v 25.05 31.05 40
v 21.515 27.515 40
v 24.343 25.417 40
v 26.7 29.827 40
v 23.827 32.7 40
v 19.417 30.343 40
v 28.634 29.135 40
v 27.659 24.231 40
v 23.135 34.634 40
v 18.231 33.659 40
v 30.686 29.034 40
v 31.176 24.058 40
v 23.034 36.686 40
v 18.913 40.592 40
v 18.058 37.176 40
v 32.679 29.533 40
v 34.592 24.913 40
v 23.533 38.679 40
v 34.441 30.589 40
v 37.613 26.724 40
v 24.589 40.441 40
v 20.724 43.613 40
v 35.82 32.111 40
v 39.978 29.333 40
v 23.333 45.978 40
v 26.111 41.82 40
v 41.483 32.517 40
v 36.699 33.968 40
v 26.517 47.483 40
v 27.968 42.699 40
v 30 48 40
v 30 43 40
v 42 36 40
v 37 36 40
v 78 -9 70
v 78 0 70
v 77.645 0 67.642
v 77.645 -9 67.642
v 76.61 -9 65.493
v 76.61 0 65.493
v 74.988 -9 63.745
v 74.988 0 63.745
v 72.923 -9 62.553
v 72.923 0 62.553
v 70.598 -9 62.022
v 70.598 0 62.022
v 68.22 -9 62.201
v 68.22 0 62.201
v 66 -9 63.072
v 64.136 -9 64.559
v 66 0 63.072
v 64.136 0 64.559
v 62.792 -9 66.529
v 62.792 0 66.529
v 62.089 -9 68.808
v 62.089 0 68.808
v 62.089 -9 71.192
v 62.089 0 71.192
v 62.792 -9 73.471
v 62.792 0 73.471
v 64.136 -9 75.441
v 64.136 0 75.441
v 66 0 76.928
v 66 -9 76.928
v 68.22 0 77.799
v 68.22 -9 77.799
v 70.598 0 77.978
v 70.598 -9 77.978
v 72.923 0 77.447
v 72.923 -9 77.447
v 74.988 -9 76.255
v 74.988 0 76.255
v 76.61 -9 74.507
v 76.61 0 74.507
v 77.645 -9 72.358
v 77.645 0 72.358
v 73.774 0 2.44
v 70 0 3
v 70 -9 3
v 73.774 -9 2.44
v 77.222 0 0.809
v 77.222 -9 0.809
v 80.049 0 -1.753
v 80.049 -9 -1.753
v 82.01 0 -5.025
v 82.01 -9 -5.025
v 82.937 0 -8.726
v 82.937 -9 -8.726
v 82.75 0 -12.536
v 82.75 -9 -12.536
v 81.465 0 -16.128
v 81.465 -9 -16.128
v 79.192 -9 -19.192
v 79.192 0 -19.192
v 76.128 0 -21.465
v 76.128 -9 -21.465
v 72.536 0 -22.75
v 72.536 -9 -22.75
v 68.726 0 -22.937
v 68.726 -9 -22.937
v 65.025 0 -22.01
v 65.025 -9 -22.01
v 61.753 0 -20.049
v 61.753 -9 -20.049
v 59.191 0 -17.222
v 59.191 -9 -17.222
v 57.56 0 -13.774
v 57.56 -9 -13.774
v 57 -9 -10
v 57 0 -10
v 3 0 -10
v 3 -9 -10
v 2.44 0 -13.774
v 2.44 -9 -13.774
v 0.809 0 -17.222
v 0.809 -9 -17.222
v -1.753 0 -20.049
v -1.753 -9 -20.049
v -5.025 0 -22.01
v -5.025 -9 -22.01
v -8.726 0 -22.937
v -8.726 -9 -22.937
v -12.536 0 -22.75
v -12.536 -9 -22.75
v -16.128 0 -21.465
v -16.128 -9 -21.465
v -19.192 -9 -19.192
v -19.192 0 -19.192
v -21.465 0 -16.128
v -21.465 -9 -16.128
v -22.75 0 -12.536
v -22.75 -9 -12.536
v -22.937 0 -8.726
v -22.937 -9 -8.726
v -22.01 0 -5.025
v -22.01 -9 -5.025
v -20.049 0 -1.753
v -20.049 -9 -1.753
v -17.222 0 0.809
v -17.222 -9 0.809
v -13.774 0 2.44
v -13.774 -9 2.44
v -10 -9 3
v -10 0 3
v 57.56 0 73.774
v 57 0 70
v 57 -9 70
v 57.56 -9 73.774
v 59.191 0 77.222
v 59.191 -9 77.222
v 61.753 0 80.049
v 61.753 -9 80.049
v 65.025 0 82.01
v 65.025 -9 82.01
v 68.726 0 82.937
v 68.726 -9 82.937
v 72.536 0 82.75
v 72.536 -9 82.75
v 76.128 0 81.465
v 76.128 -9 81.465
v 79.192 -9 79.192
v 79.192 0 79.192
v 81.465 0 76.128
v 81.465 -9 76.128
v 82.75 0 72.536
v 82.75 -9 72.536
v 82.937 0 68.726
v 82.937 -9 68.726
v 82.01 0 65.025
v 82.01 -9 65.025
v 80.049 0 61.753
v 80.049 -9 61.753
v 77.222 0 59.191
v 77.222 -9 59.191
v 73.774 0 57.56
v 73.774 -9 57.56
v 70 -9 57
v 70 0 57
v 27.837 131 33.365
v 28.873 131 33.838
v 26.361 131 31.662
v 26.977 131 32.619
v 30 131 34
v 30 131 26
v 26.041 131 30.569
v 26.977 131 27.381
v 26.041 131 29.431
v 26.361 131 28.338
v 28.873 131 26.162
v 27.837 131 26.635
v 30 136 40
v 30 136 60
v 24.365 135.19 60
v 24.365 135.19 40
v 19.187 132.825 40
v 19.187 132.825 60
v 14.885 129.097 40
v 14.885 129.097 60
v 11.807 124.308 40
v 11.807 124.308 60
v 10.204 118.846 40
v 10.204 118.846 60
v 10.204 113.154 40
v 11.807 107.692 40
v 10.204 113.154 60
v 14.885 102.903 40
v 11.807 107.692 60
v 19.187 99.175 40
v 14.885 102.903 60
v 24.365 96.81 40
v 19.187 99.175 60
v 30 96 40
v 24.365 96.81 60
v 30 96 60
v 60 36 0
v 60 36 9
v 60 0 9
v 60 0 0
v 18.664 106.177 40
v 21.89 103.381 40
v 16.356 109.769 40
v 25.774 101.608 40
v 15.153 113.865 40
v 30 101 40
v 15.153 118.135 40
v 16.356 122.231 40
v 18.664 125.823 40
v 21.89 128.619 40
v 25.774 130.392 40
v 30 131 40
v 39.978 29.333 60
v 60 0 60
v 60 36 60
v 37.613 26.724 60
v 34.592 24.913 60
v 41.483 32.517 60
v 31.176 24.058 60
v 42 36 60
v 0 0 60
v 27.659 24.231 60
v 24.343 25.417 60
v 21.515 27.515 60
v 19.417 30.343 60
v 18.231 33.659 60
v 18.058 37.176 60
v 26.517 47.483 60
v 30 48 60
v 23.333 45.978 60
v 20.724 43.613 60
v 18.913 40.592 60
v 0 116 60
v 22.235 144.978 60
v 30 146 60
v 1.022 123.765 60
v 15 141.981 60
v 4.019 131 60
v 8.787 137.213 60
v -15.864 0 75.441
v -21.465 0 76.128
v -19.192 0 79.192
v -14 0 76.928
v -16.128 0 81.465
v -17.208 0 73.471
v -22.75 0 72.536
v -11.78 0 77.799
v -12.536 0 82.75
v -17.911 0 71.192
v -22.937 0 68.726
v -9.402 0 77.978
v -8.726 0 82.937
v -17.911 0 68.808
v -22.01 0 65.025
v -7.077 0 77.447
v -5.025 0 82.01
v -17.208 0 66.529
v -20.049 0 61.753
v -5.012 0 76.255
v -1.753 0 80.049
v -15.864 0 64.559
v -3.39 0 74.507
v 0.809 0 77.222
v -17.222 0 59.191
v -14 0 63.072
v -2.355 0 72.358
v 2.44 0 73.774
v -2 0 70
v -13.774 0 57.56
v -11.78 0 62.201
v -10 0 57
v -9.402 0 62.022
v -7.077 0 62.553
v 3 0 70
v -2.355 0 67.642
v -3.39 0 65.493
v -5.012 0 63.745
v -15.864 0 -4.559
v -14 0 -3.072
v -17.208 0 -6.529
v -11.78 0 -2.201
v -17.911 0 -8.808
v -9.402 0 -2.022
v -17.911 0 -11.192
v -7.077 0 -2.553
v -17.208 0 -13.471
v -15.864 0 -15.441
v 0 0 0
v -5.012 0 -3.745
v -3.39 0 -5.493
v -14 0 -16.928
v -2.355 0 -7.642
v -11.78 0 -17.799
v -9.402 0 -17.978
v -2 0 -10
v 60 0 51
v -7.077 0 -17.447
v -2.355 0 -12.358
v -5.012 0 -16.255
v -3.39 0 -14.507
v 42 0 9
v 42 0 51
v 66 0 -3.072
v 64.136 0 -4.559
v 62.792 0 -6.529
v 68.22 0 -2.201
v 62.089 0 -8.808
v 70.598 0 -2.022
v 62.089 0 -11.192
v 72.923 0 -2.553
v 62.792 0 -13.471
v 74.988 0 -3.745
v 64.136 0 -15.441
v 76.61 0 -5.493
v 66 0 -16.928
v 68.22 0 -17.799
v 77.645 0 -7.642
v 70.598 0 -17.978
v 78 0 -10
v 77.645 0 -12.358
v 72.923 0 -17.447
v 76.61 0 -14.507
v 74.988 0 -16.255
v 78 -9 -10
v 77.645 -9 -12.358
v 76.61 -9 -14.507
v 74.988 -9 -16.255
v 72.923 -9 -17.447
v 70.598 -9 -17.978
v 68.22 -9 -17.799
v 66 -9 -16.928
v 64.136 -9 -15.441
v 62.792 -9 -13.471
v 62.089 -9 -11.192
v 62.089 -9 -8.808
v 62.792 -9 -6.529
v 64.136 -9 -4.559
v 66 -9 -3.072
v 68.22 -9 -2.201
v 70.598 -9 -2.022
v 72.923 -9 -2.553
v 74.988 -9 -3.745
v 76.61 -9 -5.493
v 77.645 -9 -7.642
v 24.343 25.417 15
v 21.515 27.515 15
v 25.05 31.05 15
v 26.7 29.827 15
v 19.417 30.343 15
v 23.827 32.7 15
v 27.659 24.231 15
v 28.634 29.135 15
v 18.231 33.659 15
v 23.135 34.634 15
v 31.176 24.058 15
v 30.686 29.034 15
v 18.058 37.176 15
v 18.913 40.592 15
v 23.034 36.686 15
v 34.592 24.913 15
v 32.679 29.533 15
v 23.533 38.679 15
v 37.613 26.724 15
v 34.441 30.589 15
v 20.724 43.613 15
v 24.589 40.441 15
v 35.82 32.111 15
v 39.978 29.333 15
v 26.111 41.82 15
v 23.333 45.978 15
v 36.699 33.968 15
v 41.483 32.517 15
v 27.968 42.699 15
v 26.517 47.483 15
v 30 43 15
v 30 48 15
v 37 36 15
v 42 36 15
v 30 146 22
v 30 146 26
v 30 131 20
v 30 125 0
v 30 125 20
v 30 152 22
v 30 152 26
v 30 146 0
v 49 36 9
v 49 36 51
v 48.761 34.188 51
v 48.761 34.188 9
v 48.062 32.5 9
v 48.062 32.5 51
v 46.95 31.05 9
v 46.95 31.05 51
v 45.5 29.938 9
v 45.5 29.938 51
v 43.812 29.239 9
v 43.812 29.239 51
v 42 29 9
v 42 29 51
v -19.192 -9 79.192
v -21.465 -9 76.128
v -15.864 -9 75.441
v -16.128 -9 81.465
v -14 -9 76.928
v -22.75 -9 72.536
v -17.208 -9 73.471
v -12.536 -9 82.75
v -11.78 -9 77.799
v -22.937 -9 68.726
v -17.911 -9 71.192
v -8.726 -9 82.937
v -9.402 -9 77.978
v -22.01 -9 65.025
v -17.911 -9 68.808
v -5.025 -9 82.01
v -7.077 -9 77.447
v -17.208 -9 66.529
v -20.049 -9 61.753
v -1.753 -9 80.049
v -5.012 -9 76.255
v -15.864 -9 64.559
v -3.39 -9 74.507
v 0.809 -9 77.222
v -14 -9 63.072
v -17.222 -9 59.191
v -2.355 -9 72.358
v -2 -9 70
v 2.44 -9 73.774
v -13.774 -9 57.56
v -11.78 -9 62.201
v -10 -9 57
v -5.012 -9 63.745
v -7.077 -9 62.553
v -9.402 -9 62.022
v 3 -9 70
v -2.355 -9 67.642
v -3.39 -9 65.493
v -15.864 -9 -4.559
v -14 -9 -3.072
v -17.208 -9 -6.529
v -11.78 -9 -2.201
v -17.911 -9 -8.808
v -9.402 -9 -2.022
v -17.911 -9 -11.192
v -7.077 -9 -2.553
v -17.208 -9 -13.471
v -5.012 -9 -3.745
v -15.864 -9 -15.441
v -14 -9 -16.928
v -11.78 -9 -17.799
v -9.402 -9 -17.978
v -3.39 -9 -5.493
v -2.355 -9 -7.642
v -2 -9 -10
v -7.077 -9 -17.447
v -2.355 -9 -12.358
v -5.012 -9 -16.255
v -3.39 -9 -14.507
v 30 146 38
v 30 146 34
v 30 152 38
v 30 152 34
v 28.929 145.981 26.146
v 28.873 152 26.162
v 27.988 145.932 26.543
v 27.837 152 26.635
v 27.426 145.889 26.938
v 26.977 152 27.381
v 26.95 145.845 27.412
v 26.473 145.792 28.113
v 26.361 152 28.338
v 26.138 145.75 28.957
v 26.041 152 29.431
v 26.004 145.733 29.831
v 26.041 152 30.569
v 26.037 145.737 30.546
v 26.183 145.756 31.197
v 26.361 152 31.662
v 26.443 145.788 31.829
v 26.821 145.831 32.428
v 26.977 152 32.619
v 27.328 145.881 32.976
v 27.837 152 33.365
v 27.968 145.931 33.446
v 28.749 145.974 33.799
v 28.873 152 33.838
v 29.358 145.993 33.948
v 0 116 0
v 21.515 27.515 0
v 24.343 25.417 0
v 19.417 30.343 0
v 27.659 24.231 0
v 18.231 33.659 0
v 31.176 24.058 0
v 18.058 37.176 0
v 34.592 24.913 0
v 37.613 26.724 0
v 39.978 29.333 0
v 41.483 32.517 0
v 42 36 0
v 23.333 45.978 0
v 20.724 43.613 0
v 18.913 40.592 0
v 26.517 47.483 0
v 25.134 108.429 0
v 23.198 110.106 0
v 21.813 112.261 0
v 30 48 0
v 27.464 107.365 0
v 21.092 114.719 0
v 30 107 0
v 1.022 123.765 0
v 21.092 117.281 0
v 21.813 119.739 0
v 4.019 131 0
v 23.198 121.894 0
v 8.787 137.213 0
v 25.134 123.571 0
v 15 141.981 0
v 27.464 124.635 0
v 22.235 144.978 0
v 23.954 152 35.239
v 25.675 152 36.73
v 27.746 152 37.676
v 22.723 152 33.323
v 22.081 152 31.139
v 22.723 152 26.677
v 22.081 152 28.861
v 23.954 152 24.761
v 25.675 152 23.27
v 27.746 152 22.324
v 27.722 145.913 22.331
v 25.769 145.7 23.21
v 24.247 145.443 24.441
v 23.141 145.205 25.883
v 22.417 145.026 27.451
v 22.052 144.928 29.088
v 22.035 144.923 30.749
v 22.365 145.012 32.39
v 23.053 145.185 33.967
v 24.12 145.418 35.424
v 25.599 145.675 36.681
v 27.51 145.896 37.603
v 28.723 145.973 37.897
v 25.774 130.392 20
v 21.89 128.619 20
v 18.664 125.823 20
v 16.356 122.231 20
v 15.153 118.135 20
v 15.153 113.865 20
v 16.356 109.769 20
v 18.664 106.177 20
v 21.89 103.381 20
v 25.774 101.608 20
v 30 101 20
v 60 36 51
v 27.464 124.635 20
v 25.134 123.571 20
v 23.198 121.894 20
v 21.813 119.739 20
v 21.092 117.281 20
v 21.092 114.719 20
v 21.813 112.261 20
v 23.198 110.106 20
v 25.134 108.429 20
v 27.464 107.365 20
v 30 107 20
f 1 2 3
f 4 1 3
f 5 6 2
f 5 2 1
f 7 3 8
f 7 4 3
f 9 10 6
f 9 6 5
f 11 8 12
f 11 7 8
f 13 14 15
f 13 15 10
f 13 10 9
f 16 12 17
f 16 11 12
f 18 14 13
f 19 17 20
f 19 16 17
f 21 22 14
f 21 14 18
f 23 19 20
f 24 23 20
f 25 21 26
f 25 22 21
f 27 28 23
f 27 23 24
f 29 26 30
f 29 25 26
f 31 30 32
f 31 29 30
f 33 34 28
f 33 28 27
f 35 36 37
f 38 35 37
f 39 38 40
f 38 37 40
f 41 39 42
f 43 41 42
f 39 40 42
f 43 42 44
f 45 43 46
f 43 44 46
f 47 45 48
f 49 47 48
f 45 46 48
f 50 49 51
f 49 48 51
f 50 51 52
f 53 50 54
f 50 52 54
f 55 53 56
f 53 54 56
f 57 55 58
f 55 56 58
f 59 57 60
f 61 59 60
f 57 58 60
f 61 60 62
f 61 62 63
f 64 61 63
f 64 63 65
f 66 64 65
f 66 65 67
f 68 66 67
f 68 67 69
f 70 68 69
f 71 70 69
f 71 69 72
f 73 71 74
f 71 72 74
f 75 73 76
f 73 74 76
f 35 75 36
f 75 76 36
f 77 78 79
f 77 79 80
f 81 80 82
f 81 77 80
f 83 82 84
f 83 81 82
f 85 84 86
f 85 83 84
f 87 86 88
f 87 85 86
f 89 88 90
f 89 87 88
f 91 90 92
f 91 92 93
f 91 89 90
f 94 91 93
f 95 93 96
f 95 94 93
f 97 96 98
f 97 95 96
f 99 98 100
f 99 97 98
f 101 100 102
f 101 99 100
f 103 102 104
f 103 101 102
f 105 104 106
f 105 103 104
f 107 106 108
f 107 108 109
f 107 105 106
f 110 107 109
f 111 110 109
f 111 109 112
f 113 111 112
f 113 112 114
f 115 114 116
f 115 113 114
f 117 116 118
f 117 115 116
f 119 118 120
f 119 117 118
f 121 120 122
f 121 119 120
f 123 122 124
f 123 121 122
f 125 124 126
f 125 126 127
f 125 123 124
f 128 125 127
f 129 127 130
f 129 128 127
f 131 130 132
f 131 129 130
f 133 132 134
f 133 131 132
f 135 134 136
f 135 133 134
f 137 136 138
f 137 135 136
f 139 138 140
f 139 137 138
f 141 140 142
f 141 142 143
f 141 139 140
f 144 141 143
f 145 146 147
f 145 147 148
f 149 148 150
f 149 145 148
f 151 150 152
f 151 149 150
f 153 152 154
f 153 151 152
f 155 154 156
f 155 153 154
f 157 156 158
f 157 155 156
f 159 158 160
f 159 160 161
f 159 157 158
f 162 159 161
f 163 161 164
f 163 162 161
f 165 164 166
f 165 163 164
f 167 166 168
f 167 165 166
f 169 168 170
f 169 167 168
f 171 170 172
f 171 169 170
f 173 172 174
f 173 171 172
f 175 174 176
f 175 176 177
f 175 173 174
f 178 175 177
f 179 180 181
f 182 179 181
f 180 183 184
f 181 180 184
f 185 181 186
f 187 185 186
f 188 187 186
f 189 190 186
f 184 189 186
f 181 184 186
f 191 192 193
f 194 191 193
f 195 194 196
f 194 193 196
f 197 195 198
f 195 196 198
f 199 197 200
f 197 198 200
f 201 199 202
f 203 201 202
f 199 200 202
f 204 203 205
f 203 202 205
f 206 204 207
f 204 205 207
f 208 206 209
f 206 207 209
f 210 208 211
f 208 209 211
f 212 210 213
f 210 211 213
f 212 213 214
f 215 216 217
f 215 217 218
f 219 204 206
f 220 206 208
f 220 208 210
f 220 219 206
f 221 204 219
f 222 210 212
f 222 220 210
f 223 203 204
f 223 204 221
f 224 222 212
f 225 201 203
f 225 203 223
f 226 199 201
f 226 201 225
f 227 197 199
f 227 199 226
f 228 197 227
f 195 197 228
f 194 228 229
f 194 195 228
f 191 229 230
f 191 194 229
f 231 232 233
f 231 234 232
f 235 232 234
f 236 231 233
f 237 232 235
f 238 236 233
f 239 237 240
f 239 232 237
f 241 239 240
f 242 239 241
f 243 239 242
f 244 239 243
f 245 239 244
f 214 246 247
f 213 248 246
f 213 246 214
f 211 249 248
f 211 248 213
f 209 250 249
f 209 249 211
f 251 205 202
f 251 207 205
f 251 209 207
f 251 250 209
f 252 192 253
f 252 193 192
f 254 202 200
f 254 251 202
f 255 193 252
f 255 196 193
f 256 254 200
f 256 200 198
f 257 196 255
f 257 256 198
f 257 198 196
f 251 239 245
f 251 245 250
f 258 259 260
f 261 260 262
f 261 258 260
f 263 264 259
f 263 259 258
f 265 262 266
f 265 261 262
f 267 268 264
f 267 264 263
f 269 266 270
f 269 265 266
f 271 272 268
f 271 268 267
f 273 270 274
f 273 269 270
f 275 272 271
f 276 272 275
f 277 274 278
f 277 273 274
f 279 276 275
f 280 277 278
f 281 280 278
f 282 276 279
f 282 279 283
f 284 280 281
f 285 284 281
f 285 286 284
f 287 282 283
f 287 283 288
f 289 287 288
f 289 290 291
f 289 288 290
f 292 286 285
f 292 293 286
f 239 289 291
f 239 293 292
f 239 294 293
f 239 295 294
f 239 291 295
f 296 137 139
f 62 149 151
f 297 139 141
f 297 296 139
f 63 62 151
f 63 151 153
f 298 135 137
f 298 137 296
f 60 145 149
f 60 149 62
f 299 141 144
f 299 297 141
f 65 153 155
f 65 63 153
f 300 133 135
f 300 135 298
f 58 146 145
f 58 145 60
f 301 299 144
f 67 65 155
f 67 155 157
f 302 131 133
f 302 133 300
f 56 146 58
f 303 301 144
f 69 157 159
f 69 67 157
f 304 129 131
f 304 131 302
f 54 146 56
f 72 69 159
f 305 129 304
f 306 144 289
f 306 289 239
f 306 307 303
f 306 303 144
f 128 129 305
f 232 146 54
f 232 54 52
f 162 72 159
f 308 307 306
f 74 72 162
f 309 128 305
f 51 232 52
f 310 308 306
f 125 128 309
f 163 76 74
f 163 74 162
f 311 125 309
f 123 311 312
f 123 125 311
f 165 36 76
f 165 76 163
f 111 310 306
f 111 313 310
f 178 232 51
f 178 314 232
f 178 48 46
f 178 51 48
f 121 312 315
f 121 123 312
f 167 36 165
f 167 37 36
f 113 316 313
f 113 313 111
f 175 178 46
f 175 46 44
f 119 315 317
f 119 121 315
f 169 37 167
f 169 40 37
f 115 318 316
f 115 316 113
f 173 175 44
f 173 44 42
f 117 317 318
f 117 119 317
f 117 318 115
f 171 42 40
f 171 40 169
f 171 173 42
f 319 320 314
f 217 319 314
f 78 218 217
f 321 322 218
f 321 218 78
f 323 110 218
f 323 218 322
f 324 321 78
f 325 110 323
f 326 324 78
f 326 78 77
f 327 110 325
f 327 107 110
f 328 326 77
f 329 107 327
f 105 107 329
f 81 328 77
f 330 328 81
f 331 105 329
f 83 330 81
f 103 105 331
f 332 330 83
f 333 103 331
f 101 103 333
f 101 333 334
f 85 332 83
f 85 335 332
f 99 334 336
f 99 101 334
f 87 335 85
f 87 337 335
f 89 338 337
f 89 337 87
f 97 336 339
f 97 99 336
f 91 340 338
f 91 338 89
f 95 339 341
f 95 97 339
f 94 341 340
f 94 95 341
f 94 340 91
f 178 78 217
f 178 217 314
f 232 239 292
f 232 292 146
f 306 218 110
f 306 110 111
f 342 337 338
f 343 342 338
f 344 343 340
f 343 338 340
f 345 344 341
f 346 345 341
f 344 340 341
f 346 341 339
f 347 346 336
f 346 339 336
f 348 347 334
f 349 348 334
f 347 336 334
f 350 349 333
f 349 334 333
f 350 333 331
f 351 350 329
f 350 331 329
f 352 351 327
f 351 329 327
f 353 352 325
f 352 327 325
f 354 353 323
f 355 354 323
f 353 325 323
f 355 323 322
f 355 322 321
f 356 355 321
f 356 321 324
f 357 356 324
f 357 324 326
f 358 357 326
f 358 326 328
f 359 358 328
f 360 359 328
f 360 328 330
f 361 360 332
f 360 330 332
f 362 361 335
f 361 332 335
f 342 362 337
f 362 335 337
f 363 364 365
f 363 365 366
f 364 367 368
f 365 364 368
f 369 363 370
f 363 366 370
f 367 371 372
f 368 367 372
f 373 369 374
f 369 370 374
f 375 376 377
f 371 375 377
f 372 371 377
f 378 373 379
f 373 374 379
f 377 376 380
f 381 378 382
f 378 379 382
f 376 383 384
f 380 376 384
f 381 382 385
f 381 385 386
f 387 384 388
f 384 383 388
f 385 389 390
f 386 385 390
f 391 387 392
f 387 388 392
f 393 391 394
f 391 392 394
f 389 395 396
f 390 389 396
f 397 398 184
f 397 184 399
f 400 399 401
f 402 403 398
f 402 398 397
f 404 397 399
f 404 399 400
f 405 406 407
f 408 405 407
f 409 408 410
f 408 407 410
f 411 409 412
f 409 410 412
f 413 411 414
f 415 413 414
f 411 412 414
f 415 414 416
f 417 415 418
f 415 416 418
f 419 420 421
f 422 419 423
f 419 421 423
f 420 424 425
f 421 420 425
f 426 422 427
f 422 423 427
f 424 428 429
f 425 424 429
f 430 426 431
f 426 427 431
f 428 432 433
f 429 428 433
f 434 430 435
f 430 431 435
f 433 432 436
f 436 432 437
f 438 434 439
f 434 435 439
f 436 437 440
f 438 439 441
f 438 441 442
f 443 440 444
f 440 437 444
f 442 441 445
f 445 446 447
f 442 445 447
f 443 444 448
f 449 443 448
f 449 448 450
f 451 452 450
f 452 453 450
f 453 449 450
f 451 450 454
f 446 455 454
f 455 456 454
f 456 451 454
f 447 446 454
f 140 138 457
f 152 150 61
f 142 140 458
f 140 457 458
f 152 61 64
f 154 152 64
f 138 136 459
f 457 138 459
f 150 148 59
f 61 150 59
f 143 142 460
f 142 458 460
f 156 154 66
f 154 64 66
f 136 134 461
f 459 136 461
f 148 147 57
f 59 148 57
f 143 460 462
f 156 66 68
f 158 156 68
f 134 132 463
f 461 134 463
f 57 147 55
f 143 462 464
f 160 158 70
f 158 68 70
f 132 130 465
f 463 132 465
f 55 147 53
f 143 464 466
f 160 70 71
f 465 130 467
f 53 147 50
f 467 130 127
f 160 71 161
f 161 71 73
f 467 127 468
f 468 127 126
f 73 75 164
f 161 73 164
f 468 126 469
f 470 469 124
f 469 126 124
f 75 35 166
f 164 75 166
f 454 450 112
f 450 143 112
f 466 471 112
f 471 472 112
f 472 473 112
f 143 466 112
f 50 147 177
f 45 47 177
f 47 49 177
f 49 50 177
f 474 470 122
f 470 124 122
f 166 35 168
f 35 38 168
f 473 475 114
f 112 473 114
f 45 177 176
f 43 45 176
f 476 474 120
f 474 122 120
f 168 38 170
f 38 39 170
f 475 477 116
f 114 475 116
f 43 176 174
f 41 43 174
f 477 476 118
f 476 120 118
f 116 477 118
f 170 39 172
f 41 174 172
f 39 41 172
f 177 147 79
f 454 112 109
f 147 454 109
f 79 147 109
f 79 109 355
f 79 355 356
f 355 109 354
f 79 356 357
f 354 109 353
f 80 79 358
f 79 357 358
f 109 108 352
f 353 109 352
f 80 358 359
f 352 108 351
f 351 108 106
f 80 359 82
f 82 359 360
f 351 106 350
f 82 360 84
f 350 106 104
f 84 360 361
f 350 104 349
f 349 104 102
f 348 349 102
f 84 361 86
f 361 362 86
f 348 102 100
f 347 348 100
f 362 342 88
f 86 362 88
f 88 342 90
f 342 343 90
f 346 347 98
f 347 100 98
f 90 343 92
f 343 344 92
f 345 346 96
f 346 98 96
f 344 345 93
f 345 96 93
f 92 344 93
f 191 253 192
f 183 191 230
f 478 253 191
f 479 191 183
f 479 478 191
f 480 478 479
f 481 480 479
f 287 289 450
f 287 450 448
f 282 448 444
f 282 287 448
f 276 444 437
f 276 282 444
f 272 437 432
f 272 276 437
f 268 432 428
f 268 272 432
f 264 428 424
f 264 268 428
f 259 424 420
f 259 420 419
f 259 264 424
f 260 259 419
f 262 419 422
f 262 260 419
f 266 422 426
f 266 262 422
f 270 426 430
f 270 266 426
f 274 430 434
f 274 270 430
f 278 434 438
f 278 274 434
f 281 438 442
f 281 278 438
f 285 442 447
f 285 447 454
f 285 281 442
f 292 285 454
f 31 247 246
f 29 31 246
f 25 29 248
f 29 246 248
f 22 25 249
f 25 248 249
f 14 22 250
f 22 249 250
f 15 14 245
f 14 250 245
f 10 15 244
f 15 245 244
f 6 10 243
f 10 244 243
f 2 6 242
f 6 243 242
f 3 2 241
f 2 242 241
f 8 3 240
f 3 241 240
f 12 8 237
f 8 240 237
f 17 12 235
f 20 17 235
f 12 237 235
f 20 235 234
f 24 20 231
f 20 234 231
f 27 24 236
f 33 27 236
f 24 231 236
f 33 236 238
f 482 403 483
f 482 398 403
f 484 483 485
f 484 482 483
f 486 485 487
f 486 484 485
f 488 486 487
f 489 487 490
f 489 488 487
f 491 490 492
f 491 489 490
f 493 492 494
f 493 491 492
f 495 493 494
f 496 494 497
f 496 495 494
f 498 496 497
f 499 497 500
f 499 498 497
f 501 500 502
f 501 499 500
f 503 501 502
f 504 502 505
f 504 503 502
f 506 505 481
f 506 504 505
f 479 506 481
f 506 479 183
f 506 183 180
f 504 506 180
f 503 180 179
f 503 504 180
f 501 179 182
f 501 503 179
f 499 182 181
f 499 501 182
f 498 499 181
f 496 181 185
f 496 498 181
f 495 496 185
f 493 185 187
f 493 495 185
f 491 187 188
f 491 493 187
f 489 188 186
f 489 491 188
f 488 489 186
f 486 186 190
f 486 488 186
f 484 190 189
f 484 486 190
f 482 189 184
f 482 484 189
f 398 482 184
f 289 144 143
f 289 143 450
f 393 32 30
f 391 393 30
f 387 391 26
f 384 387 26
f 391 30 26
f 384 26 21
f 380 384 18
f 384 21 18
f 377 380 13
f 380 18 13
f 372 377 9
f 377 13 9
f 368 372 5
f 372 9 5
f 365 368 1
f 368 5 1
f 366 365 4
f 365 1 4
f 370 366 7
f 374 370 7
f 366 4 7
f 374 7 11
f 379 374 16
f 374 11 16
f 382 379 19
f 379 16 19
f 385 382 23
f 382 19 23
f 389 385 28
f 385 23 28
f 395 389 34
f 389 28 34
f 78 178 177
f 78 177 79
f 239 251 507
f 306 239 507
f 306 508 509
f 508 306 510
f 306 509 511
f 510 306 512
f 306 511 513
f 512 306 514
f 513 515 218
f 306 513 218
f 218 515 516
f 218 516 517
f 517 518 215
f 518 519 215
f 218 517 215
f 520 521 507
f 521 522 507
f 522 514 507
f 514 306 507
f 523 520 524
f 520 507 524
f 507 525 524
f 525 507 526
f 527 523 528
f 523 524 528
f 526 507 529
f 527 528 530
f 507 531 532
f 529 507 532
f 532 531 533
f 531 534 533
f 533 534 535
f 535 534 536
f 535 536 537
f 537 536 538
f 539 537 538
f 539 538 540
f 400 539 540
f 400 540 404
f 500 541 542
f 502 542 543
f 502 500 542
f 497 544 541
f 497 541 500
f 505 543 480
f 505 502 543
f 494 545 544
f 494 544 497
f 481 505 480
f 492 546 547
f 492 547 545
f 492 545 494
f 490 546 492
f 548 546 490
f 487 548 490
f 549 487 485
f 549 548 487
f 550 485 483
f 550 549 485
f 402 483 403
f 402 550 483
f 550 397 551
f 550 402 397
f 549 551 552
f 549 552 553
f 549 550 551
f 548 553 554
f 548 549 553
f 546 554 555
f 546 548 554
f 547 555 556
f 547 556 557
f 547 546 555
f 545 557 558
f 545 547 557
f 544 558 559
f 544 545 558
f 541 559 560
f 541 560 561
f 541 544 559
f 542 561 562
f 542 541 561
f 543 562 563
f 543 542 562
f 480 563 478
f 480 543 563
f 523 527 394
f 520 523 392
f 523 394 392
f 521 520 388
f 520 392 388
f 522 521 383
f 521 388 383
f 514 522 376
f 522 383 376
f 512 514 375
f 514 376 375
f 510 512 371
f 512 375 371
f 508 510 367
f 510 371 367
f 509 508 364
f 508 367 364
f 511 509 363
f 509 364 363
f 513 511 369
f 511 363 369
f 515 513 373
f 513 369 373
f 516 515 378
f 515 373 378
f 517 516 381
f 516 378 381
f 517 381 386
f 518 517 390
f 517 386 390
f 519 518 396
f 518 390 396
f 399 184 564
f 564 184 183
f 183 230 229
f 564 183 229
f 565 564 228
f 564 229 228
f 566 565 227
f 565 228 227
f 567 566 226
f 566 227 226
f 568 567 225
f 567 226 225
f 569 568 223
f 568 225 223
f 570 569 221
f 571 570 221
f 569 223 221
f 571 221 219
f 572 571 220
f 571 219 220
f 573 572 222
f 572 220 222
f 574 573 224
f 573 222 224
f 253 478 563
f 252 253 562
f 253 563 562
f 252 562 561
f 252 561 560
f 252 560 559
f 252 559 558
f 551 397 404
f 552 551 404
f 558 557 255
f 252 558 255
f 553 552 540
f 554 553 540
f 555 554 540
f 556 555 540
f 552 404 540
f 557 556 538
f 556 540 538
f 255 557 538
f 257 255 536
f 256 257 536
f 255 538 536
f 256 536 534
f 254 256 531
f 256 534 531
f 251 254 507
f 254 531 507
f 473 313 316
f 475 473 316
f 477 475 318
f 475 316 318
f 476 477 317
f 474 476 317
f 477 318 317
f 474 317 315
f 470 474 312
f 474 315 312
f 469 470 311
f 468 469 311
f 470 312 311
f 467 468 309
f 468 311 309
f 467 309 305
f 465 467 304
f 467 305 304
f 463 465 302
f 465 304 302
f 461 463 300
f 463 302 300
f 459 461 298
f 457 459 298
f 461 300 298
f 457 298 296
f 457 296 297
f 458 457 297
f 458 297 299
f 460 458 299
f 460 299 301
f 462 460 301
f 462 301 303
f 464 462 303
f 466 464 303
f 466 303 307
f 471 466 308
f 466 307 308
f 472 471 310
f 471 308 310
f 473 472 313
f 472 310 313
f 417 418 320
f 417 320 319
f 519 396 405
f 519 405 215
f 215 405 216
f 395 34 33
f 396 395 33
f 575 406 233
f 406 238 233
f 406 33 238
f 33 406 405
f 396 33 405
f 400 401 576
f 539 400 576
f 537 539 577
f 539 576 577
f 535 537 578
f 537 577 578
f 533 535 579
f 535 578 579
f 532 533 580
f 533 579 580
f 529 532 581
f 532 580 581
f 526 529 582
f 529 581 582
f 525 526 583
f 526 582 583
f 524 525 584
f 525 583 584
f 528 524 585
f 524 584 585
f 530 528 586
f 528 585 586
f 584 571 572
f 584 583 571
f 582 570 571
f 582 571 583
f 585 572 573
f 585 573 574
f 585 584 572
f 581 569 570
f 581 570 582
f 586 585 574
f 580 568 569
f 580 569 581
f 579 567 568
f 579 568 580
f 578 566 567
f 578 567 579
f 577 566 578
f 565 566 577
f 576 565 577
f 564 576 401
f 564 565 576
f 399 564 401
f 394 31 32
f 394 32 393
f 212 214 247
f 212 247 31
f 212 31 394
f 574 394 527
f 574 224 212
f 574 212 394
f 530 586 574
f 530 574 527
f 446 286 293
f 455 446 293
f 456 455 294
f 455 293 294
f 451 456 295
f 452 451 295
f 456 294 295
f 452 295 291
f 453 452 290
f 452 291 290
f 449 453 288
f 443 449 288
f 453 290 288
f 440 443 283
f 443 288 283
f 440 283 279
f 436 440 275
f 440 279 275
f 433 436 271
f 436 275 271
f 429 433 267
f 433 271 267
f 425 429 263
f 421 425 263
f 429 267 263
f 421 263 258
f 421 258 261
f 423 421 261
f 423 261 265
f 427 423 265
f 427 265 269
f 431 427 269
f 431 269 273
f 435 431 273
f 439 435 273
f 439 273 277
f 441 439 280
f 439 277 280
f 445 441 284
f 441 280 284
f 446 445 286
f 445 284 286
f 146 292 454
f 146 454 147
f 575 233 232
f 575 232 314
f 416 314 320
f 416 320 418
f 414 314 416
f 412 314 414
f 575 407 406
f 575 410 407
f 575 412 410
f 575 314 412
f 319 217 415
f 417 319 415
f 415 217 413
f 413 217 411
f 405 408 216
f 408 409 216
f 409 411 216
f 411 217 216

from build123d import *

# Parameters (mm, degrees)
IZIM1_W                          = 60
IZIM1_H                          = 116
Y_KSEKLIK_EKSTR_ZYON1_DEPTH      = 60
IZIM2_R                          = 8
Y_KSEKLIK_EKSTR_ZYON2_DEPTH      = 9
IZIM3_R                          = 30
Y_KSEKLIK_EKSTR_ZYON3_DEPTH      = 60
IZIM4_R                          = 20
KES_EKSTR_ZYON1_DEPTH            = 20
IZIM5_R                          = 15
KES_EKSTR_ZYON2_DEPTH            = 20
IZIM6_R                          = 9
KES_EKSTR_ZYON3_DEPTH            = 20
IZIM7_R                          = 12
KES_EKSTR_ZYON4_DEPTH            = 20
IZIM8_R                          = 7
KES_EKSTR_ZYON5_DEPTH            = 25
IZIM9_R                          = 12
KES_EKSTR_ZYON6_DEPTH            = 15
KES_EKSTR_ZYON8_DEPTH            = 30
IZIM13_W                         = 60
IZIM13_H                         = 30
KES_EKSTR_ZYON9_DEPTH            = 30
IZIM14_R                         = 8
IZIM14_R_2                       = 4
Y_KSEKLIK_EKSTR_ZYON5_DEPTH      = 6
Y_KSEKLIK_EKSTR_ZYON5_DEPTH_BACK = 15
IZIM16_W                         = 8
IZIM16_H                         = 21
KES_EKSTR_ZYON10_DEPTH           = 57
KES_EKSTR_ZYON12_DEPTH           = 15
IZIM18_W                         = 42
IZIM18_H                         = 36
KES_EKSTR_ZYON13_DEPTH           = 18
Y_KSEKLIK_EKSTR_ZYON7_DEPTH      = 42


with BuildPart() as part:
    # Çizim1 → Yükseklik-Ekstrüzyon1 (new body)
    with BuildSketch(Plane(origin=(0, 0, 0), x_dir=(0, 0, -1), z_dir=(1, 0, 0))):
        with Locations((-30, 58)):
            Rectangle(IZIM1_W, IZIM1_H)
    extrude(amount=Y_KSEKLIK_EKSTR_ZYON1_DEPTH)

    # Çizim2 → Yükseklik-Ekstrüzyon2 (add)
    with BuildSketch(Plane(origin=(0, 0, 0), x_dir=(1, 0, 0), z_dir=(0, 1, 0))):
        with BuildLine():
            Line((57, 10), (3, 10))
            ThreePointArc((3, 10), (-19.192388155, 19.192388155), (-10, -3))
            Line((-10, -3), (-10, -57))
            ThreePointArc((-10, -57), (-19.192388155, -79.192388155), (3, -70))
            Line((3, -70), (57, -70))
            ThreePointArc((57, -70), (79.192388155, -79.192388155), (70, -57))
            Line((70, -57), (70, -3))
            ThreePointArc((70, -3), (79.192388155, 19.192388155), (57, 10))
        make_face()
        with Locations((-10, 10)):
            Circle(IZIM2_R, mode=Mode.SUBTRACT)
        with Locations((-10, -70)):
            Circle(IZIM2_R, mode=Mode.SUBTRACT)
        with Locations((70, -70)):
            Circle(IZIM2_R, mode=Mode.SUBTRACT)
        with Locations((70, 10)):
            Circle(IZIM2_R, mode=Mode.SUBTRACT)
    extrude(amount=-Y_KSEKLIK_EKSTR_ZYON2_DEPTH)

    # Çizim3 → Yükseklik-Ekstrüzyon3 (add)
    with BuildSketch(Plane.XY):
        with Locations((30, 116)):
            Circle(IZIM3_R)
    extrude(amount=Y_KSEKLIK_EKSTR_ZYON3_DEPTH)

    # Çizim4 → Kes-Ekstrüzyon1 (cut)
    with BuildSketch(Plane.XY.offset(60)):
        with Locations((30, 116)):
            Circle(IZIM4_R)
    extrude(amount=-KES_EKSTR_ZYON1_DEPTH, mode=Mode.SUBTRACT)

    # Çizim5 → Kes-Ekstrüzyon2 (cut)
    with BuildSketch(Plane.XY.offset(40)):
        with Locations((30, 116)):
            Circle(IZIM5_R)
    extrude(amount=-KES_EKSTR_ZYON2_DEPTH, mode=Mode.SUBTRACT)

    # Çizim6 → Kes-Ekstrüzyon3 (cut)
    with BuildSketch(Plane.XY.offset(20)):
        with Locations((30, 116)):
            Circle(IZIM6_R)
    extrude(amount=-KES_EKSTR_ZYON3_DEPTH, mode=Mode.SUBTRACT)

    # Çizim7 → Kes-Ekstrüzyon4 (cut)
    with BuildSketch(Plane.XY.offset(60)):
        with Locations((30, 36)):
            Circle(IZIM7_R)
    extrude(amount=-KES_EKSTR_ZYON4_DEPTH, mode=Mode.SUBTRACT)

    # Çizim8 → Kes-Ekstrüzyon5 (cut)
    with BuildSketch(Plane.XY.offset(40)):
        with Locations((30, 36)):
            Circle(IZIM8_R)
    extrude(amount=-KES_EKSTR_ZYON5_DEPTH, mode=Mode.SUBTRACT)

    # Çizim9 → Kes-Ekstrüzyon6 (cut)
    with BuildSketch(Plane.XY.offset(15)):
        with Locations((30, 36)):
            Circle(IZIM9_R)
    extrude(amount=-KES_EKSTR_ZYON6_DEPTH, mode=Mode.SUBTRACT)

    # Çizim10 → Kes-Ekstrüzyon8 (cut)
    with BuildSketch(Plane(origin=(60, 0, 0), x_dir=(0, 0, -1), z_dir=(1, 0, 0))):
        Polygon((-60, 116), (-60, 36), (-51, 36), (-9, 36), (0, 36), (0, 116), align=None)
    extrude(amount=-KES_EKSTR_ZYON8_DEPTH, mode=Mode.SUBTRACT)

    # Çizim13 → Kes-Ekstrüzyon9 (cut)
    with BuildSketch(Plane(origin=(30, 0, 0), x_dir=(0, 0, -1), z_dir=(1, 0, 0))):
        with Locations((-30, 131)):
            Rectangle(IZIM13_W, IZIM13_H)
    extrude(amount=KES_EKSTR_ZYON9_DEPTH, mode=Mode.SUBTRACT)

    # Çizim14 → Yükseklik-Ekstrüzyon5 (add, two sides)
    with BuildSketch(Plane(origin=(0, 146, 0), x_dir=(1, 0, 0), z_dir=(0, 1, 0))) as y_kseklik_ekstr_zyon5_sk:
        with Locations((30, -30)):
            Circle(IZIM14_R)
        with Locations((30, -30)):
            Circle(IZIM14_R_2, mode=Mode.SUBTRACT)
    extrude(amount=Y_KSEKLIK_EKSTR_ZYON5_DEPTH)
    extrude(y_kseklik_ekstr_zyon5_sk.sketch, amount=-Y_KSEKLIK_EKSTR_ZYON5_DEPTH_BACK)

    # Çizim16 → Kes-Ekstrüzyon10 (cut)
    with BuildSketch(Plane.XY.offset(46)):
        with Locations((34, 141.5)):
            Rectangle(IZIM16_W, IZIM16_H)
    extrude(amount=-KES_EKSTR_ZYON10_DEPTH, mode=Mode.SUBTRACT)

    # Çizim17 → Kes-Ekstrüzyon12 (cut)
    with BuildSketch(Plane(origin=(0, 146, 0), x_dir=(1, 0, 0), z_dir=(0, 1, 0))):
        with BuildLine():
            Line((30, -26), (30, -34))
            ThreePointArc((30, -34), (26, -30), (30, -26))
        make_face()
    extrude(amount=-KES_EKSTR_ZYON12_DEPTH, mode=Mode.SUBTRACT)

    # Çizim18 → Kes-Ekstrüzyon13 (cut)
    with BuildSketch(Plane(origin=(60, 0, 0), x_dir=(0, 0, -1), z_dir=(1, 0, 0))):
        with Locations((-30, 18)):
            Rectangle(IZIM18_W, IZIM18_H)
    extrude(amount=-KES_EKSTR_ZYON13_DEPTH, mode=Mode.SUBTRACT)

    # Çizim21 → Yükseklik-Ekstrüzyon7 (add)
    with BuildSketch(Plane(origin=(0, 0, 51), x_dir=(-1, 0, 0), z_dir=(0, 0, -1))):
        with BuildLine():
            Line((-42, 29), (-42, 36))
            Line((-42, 36), (-49, 36))
            ThreePointArc((-49, 36), (-46.949747468, 31.050252532), (-42, 29))
        make_face()
    extrude(amount=Y_KSEKLIK_EKSTR_ZYON7_DEPTH)


solid = part.part
